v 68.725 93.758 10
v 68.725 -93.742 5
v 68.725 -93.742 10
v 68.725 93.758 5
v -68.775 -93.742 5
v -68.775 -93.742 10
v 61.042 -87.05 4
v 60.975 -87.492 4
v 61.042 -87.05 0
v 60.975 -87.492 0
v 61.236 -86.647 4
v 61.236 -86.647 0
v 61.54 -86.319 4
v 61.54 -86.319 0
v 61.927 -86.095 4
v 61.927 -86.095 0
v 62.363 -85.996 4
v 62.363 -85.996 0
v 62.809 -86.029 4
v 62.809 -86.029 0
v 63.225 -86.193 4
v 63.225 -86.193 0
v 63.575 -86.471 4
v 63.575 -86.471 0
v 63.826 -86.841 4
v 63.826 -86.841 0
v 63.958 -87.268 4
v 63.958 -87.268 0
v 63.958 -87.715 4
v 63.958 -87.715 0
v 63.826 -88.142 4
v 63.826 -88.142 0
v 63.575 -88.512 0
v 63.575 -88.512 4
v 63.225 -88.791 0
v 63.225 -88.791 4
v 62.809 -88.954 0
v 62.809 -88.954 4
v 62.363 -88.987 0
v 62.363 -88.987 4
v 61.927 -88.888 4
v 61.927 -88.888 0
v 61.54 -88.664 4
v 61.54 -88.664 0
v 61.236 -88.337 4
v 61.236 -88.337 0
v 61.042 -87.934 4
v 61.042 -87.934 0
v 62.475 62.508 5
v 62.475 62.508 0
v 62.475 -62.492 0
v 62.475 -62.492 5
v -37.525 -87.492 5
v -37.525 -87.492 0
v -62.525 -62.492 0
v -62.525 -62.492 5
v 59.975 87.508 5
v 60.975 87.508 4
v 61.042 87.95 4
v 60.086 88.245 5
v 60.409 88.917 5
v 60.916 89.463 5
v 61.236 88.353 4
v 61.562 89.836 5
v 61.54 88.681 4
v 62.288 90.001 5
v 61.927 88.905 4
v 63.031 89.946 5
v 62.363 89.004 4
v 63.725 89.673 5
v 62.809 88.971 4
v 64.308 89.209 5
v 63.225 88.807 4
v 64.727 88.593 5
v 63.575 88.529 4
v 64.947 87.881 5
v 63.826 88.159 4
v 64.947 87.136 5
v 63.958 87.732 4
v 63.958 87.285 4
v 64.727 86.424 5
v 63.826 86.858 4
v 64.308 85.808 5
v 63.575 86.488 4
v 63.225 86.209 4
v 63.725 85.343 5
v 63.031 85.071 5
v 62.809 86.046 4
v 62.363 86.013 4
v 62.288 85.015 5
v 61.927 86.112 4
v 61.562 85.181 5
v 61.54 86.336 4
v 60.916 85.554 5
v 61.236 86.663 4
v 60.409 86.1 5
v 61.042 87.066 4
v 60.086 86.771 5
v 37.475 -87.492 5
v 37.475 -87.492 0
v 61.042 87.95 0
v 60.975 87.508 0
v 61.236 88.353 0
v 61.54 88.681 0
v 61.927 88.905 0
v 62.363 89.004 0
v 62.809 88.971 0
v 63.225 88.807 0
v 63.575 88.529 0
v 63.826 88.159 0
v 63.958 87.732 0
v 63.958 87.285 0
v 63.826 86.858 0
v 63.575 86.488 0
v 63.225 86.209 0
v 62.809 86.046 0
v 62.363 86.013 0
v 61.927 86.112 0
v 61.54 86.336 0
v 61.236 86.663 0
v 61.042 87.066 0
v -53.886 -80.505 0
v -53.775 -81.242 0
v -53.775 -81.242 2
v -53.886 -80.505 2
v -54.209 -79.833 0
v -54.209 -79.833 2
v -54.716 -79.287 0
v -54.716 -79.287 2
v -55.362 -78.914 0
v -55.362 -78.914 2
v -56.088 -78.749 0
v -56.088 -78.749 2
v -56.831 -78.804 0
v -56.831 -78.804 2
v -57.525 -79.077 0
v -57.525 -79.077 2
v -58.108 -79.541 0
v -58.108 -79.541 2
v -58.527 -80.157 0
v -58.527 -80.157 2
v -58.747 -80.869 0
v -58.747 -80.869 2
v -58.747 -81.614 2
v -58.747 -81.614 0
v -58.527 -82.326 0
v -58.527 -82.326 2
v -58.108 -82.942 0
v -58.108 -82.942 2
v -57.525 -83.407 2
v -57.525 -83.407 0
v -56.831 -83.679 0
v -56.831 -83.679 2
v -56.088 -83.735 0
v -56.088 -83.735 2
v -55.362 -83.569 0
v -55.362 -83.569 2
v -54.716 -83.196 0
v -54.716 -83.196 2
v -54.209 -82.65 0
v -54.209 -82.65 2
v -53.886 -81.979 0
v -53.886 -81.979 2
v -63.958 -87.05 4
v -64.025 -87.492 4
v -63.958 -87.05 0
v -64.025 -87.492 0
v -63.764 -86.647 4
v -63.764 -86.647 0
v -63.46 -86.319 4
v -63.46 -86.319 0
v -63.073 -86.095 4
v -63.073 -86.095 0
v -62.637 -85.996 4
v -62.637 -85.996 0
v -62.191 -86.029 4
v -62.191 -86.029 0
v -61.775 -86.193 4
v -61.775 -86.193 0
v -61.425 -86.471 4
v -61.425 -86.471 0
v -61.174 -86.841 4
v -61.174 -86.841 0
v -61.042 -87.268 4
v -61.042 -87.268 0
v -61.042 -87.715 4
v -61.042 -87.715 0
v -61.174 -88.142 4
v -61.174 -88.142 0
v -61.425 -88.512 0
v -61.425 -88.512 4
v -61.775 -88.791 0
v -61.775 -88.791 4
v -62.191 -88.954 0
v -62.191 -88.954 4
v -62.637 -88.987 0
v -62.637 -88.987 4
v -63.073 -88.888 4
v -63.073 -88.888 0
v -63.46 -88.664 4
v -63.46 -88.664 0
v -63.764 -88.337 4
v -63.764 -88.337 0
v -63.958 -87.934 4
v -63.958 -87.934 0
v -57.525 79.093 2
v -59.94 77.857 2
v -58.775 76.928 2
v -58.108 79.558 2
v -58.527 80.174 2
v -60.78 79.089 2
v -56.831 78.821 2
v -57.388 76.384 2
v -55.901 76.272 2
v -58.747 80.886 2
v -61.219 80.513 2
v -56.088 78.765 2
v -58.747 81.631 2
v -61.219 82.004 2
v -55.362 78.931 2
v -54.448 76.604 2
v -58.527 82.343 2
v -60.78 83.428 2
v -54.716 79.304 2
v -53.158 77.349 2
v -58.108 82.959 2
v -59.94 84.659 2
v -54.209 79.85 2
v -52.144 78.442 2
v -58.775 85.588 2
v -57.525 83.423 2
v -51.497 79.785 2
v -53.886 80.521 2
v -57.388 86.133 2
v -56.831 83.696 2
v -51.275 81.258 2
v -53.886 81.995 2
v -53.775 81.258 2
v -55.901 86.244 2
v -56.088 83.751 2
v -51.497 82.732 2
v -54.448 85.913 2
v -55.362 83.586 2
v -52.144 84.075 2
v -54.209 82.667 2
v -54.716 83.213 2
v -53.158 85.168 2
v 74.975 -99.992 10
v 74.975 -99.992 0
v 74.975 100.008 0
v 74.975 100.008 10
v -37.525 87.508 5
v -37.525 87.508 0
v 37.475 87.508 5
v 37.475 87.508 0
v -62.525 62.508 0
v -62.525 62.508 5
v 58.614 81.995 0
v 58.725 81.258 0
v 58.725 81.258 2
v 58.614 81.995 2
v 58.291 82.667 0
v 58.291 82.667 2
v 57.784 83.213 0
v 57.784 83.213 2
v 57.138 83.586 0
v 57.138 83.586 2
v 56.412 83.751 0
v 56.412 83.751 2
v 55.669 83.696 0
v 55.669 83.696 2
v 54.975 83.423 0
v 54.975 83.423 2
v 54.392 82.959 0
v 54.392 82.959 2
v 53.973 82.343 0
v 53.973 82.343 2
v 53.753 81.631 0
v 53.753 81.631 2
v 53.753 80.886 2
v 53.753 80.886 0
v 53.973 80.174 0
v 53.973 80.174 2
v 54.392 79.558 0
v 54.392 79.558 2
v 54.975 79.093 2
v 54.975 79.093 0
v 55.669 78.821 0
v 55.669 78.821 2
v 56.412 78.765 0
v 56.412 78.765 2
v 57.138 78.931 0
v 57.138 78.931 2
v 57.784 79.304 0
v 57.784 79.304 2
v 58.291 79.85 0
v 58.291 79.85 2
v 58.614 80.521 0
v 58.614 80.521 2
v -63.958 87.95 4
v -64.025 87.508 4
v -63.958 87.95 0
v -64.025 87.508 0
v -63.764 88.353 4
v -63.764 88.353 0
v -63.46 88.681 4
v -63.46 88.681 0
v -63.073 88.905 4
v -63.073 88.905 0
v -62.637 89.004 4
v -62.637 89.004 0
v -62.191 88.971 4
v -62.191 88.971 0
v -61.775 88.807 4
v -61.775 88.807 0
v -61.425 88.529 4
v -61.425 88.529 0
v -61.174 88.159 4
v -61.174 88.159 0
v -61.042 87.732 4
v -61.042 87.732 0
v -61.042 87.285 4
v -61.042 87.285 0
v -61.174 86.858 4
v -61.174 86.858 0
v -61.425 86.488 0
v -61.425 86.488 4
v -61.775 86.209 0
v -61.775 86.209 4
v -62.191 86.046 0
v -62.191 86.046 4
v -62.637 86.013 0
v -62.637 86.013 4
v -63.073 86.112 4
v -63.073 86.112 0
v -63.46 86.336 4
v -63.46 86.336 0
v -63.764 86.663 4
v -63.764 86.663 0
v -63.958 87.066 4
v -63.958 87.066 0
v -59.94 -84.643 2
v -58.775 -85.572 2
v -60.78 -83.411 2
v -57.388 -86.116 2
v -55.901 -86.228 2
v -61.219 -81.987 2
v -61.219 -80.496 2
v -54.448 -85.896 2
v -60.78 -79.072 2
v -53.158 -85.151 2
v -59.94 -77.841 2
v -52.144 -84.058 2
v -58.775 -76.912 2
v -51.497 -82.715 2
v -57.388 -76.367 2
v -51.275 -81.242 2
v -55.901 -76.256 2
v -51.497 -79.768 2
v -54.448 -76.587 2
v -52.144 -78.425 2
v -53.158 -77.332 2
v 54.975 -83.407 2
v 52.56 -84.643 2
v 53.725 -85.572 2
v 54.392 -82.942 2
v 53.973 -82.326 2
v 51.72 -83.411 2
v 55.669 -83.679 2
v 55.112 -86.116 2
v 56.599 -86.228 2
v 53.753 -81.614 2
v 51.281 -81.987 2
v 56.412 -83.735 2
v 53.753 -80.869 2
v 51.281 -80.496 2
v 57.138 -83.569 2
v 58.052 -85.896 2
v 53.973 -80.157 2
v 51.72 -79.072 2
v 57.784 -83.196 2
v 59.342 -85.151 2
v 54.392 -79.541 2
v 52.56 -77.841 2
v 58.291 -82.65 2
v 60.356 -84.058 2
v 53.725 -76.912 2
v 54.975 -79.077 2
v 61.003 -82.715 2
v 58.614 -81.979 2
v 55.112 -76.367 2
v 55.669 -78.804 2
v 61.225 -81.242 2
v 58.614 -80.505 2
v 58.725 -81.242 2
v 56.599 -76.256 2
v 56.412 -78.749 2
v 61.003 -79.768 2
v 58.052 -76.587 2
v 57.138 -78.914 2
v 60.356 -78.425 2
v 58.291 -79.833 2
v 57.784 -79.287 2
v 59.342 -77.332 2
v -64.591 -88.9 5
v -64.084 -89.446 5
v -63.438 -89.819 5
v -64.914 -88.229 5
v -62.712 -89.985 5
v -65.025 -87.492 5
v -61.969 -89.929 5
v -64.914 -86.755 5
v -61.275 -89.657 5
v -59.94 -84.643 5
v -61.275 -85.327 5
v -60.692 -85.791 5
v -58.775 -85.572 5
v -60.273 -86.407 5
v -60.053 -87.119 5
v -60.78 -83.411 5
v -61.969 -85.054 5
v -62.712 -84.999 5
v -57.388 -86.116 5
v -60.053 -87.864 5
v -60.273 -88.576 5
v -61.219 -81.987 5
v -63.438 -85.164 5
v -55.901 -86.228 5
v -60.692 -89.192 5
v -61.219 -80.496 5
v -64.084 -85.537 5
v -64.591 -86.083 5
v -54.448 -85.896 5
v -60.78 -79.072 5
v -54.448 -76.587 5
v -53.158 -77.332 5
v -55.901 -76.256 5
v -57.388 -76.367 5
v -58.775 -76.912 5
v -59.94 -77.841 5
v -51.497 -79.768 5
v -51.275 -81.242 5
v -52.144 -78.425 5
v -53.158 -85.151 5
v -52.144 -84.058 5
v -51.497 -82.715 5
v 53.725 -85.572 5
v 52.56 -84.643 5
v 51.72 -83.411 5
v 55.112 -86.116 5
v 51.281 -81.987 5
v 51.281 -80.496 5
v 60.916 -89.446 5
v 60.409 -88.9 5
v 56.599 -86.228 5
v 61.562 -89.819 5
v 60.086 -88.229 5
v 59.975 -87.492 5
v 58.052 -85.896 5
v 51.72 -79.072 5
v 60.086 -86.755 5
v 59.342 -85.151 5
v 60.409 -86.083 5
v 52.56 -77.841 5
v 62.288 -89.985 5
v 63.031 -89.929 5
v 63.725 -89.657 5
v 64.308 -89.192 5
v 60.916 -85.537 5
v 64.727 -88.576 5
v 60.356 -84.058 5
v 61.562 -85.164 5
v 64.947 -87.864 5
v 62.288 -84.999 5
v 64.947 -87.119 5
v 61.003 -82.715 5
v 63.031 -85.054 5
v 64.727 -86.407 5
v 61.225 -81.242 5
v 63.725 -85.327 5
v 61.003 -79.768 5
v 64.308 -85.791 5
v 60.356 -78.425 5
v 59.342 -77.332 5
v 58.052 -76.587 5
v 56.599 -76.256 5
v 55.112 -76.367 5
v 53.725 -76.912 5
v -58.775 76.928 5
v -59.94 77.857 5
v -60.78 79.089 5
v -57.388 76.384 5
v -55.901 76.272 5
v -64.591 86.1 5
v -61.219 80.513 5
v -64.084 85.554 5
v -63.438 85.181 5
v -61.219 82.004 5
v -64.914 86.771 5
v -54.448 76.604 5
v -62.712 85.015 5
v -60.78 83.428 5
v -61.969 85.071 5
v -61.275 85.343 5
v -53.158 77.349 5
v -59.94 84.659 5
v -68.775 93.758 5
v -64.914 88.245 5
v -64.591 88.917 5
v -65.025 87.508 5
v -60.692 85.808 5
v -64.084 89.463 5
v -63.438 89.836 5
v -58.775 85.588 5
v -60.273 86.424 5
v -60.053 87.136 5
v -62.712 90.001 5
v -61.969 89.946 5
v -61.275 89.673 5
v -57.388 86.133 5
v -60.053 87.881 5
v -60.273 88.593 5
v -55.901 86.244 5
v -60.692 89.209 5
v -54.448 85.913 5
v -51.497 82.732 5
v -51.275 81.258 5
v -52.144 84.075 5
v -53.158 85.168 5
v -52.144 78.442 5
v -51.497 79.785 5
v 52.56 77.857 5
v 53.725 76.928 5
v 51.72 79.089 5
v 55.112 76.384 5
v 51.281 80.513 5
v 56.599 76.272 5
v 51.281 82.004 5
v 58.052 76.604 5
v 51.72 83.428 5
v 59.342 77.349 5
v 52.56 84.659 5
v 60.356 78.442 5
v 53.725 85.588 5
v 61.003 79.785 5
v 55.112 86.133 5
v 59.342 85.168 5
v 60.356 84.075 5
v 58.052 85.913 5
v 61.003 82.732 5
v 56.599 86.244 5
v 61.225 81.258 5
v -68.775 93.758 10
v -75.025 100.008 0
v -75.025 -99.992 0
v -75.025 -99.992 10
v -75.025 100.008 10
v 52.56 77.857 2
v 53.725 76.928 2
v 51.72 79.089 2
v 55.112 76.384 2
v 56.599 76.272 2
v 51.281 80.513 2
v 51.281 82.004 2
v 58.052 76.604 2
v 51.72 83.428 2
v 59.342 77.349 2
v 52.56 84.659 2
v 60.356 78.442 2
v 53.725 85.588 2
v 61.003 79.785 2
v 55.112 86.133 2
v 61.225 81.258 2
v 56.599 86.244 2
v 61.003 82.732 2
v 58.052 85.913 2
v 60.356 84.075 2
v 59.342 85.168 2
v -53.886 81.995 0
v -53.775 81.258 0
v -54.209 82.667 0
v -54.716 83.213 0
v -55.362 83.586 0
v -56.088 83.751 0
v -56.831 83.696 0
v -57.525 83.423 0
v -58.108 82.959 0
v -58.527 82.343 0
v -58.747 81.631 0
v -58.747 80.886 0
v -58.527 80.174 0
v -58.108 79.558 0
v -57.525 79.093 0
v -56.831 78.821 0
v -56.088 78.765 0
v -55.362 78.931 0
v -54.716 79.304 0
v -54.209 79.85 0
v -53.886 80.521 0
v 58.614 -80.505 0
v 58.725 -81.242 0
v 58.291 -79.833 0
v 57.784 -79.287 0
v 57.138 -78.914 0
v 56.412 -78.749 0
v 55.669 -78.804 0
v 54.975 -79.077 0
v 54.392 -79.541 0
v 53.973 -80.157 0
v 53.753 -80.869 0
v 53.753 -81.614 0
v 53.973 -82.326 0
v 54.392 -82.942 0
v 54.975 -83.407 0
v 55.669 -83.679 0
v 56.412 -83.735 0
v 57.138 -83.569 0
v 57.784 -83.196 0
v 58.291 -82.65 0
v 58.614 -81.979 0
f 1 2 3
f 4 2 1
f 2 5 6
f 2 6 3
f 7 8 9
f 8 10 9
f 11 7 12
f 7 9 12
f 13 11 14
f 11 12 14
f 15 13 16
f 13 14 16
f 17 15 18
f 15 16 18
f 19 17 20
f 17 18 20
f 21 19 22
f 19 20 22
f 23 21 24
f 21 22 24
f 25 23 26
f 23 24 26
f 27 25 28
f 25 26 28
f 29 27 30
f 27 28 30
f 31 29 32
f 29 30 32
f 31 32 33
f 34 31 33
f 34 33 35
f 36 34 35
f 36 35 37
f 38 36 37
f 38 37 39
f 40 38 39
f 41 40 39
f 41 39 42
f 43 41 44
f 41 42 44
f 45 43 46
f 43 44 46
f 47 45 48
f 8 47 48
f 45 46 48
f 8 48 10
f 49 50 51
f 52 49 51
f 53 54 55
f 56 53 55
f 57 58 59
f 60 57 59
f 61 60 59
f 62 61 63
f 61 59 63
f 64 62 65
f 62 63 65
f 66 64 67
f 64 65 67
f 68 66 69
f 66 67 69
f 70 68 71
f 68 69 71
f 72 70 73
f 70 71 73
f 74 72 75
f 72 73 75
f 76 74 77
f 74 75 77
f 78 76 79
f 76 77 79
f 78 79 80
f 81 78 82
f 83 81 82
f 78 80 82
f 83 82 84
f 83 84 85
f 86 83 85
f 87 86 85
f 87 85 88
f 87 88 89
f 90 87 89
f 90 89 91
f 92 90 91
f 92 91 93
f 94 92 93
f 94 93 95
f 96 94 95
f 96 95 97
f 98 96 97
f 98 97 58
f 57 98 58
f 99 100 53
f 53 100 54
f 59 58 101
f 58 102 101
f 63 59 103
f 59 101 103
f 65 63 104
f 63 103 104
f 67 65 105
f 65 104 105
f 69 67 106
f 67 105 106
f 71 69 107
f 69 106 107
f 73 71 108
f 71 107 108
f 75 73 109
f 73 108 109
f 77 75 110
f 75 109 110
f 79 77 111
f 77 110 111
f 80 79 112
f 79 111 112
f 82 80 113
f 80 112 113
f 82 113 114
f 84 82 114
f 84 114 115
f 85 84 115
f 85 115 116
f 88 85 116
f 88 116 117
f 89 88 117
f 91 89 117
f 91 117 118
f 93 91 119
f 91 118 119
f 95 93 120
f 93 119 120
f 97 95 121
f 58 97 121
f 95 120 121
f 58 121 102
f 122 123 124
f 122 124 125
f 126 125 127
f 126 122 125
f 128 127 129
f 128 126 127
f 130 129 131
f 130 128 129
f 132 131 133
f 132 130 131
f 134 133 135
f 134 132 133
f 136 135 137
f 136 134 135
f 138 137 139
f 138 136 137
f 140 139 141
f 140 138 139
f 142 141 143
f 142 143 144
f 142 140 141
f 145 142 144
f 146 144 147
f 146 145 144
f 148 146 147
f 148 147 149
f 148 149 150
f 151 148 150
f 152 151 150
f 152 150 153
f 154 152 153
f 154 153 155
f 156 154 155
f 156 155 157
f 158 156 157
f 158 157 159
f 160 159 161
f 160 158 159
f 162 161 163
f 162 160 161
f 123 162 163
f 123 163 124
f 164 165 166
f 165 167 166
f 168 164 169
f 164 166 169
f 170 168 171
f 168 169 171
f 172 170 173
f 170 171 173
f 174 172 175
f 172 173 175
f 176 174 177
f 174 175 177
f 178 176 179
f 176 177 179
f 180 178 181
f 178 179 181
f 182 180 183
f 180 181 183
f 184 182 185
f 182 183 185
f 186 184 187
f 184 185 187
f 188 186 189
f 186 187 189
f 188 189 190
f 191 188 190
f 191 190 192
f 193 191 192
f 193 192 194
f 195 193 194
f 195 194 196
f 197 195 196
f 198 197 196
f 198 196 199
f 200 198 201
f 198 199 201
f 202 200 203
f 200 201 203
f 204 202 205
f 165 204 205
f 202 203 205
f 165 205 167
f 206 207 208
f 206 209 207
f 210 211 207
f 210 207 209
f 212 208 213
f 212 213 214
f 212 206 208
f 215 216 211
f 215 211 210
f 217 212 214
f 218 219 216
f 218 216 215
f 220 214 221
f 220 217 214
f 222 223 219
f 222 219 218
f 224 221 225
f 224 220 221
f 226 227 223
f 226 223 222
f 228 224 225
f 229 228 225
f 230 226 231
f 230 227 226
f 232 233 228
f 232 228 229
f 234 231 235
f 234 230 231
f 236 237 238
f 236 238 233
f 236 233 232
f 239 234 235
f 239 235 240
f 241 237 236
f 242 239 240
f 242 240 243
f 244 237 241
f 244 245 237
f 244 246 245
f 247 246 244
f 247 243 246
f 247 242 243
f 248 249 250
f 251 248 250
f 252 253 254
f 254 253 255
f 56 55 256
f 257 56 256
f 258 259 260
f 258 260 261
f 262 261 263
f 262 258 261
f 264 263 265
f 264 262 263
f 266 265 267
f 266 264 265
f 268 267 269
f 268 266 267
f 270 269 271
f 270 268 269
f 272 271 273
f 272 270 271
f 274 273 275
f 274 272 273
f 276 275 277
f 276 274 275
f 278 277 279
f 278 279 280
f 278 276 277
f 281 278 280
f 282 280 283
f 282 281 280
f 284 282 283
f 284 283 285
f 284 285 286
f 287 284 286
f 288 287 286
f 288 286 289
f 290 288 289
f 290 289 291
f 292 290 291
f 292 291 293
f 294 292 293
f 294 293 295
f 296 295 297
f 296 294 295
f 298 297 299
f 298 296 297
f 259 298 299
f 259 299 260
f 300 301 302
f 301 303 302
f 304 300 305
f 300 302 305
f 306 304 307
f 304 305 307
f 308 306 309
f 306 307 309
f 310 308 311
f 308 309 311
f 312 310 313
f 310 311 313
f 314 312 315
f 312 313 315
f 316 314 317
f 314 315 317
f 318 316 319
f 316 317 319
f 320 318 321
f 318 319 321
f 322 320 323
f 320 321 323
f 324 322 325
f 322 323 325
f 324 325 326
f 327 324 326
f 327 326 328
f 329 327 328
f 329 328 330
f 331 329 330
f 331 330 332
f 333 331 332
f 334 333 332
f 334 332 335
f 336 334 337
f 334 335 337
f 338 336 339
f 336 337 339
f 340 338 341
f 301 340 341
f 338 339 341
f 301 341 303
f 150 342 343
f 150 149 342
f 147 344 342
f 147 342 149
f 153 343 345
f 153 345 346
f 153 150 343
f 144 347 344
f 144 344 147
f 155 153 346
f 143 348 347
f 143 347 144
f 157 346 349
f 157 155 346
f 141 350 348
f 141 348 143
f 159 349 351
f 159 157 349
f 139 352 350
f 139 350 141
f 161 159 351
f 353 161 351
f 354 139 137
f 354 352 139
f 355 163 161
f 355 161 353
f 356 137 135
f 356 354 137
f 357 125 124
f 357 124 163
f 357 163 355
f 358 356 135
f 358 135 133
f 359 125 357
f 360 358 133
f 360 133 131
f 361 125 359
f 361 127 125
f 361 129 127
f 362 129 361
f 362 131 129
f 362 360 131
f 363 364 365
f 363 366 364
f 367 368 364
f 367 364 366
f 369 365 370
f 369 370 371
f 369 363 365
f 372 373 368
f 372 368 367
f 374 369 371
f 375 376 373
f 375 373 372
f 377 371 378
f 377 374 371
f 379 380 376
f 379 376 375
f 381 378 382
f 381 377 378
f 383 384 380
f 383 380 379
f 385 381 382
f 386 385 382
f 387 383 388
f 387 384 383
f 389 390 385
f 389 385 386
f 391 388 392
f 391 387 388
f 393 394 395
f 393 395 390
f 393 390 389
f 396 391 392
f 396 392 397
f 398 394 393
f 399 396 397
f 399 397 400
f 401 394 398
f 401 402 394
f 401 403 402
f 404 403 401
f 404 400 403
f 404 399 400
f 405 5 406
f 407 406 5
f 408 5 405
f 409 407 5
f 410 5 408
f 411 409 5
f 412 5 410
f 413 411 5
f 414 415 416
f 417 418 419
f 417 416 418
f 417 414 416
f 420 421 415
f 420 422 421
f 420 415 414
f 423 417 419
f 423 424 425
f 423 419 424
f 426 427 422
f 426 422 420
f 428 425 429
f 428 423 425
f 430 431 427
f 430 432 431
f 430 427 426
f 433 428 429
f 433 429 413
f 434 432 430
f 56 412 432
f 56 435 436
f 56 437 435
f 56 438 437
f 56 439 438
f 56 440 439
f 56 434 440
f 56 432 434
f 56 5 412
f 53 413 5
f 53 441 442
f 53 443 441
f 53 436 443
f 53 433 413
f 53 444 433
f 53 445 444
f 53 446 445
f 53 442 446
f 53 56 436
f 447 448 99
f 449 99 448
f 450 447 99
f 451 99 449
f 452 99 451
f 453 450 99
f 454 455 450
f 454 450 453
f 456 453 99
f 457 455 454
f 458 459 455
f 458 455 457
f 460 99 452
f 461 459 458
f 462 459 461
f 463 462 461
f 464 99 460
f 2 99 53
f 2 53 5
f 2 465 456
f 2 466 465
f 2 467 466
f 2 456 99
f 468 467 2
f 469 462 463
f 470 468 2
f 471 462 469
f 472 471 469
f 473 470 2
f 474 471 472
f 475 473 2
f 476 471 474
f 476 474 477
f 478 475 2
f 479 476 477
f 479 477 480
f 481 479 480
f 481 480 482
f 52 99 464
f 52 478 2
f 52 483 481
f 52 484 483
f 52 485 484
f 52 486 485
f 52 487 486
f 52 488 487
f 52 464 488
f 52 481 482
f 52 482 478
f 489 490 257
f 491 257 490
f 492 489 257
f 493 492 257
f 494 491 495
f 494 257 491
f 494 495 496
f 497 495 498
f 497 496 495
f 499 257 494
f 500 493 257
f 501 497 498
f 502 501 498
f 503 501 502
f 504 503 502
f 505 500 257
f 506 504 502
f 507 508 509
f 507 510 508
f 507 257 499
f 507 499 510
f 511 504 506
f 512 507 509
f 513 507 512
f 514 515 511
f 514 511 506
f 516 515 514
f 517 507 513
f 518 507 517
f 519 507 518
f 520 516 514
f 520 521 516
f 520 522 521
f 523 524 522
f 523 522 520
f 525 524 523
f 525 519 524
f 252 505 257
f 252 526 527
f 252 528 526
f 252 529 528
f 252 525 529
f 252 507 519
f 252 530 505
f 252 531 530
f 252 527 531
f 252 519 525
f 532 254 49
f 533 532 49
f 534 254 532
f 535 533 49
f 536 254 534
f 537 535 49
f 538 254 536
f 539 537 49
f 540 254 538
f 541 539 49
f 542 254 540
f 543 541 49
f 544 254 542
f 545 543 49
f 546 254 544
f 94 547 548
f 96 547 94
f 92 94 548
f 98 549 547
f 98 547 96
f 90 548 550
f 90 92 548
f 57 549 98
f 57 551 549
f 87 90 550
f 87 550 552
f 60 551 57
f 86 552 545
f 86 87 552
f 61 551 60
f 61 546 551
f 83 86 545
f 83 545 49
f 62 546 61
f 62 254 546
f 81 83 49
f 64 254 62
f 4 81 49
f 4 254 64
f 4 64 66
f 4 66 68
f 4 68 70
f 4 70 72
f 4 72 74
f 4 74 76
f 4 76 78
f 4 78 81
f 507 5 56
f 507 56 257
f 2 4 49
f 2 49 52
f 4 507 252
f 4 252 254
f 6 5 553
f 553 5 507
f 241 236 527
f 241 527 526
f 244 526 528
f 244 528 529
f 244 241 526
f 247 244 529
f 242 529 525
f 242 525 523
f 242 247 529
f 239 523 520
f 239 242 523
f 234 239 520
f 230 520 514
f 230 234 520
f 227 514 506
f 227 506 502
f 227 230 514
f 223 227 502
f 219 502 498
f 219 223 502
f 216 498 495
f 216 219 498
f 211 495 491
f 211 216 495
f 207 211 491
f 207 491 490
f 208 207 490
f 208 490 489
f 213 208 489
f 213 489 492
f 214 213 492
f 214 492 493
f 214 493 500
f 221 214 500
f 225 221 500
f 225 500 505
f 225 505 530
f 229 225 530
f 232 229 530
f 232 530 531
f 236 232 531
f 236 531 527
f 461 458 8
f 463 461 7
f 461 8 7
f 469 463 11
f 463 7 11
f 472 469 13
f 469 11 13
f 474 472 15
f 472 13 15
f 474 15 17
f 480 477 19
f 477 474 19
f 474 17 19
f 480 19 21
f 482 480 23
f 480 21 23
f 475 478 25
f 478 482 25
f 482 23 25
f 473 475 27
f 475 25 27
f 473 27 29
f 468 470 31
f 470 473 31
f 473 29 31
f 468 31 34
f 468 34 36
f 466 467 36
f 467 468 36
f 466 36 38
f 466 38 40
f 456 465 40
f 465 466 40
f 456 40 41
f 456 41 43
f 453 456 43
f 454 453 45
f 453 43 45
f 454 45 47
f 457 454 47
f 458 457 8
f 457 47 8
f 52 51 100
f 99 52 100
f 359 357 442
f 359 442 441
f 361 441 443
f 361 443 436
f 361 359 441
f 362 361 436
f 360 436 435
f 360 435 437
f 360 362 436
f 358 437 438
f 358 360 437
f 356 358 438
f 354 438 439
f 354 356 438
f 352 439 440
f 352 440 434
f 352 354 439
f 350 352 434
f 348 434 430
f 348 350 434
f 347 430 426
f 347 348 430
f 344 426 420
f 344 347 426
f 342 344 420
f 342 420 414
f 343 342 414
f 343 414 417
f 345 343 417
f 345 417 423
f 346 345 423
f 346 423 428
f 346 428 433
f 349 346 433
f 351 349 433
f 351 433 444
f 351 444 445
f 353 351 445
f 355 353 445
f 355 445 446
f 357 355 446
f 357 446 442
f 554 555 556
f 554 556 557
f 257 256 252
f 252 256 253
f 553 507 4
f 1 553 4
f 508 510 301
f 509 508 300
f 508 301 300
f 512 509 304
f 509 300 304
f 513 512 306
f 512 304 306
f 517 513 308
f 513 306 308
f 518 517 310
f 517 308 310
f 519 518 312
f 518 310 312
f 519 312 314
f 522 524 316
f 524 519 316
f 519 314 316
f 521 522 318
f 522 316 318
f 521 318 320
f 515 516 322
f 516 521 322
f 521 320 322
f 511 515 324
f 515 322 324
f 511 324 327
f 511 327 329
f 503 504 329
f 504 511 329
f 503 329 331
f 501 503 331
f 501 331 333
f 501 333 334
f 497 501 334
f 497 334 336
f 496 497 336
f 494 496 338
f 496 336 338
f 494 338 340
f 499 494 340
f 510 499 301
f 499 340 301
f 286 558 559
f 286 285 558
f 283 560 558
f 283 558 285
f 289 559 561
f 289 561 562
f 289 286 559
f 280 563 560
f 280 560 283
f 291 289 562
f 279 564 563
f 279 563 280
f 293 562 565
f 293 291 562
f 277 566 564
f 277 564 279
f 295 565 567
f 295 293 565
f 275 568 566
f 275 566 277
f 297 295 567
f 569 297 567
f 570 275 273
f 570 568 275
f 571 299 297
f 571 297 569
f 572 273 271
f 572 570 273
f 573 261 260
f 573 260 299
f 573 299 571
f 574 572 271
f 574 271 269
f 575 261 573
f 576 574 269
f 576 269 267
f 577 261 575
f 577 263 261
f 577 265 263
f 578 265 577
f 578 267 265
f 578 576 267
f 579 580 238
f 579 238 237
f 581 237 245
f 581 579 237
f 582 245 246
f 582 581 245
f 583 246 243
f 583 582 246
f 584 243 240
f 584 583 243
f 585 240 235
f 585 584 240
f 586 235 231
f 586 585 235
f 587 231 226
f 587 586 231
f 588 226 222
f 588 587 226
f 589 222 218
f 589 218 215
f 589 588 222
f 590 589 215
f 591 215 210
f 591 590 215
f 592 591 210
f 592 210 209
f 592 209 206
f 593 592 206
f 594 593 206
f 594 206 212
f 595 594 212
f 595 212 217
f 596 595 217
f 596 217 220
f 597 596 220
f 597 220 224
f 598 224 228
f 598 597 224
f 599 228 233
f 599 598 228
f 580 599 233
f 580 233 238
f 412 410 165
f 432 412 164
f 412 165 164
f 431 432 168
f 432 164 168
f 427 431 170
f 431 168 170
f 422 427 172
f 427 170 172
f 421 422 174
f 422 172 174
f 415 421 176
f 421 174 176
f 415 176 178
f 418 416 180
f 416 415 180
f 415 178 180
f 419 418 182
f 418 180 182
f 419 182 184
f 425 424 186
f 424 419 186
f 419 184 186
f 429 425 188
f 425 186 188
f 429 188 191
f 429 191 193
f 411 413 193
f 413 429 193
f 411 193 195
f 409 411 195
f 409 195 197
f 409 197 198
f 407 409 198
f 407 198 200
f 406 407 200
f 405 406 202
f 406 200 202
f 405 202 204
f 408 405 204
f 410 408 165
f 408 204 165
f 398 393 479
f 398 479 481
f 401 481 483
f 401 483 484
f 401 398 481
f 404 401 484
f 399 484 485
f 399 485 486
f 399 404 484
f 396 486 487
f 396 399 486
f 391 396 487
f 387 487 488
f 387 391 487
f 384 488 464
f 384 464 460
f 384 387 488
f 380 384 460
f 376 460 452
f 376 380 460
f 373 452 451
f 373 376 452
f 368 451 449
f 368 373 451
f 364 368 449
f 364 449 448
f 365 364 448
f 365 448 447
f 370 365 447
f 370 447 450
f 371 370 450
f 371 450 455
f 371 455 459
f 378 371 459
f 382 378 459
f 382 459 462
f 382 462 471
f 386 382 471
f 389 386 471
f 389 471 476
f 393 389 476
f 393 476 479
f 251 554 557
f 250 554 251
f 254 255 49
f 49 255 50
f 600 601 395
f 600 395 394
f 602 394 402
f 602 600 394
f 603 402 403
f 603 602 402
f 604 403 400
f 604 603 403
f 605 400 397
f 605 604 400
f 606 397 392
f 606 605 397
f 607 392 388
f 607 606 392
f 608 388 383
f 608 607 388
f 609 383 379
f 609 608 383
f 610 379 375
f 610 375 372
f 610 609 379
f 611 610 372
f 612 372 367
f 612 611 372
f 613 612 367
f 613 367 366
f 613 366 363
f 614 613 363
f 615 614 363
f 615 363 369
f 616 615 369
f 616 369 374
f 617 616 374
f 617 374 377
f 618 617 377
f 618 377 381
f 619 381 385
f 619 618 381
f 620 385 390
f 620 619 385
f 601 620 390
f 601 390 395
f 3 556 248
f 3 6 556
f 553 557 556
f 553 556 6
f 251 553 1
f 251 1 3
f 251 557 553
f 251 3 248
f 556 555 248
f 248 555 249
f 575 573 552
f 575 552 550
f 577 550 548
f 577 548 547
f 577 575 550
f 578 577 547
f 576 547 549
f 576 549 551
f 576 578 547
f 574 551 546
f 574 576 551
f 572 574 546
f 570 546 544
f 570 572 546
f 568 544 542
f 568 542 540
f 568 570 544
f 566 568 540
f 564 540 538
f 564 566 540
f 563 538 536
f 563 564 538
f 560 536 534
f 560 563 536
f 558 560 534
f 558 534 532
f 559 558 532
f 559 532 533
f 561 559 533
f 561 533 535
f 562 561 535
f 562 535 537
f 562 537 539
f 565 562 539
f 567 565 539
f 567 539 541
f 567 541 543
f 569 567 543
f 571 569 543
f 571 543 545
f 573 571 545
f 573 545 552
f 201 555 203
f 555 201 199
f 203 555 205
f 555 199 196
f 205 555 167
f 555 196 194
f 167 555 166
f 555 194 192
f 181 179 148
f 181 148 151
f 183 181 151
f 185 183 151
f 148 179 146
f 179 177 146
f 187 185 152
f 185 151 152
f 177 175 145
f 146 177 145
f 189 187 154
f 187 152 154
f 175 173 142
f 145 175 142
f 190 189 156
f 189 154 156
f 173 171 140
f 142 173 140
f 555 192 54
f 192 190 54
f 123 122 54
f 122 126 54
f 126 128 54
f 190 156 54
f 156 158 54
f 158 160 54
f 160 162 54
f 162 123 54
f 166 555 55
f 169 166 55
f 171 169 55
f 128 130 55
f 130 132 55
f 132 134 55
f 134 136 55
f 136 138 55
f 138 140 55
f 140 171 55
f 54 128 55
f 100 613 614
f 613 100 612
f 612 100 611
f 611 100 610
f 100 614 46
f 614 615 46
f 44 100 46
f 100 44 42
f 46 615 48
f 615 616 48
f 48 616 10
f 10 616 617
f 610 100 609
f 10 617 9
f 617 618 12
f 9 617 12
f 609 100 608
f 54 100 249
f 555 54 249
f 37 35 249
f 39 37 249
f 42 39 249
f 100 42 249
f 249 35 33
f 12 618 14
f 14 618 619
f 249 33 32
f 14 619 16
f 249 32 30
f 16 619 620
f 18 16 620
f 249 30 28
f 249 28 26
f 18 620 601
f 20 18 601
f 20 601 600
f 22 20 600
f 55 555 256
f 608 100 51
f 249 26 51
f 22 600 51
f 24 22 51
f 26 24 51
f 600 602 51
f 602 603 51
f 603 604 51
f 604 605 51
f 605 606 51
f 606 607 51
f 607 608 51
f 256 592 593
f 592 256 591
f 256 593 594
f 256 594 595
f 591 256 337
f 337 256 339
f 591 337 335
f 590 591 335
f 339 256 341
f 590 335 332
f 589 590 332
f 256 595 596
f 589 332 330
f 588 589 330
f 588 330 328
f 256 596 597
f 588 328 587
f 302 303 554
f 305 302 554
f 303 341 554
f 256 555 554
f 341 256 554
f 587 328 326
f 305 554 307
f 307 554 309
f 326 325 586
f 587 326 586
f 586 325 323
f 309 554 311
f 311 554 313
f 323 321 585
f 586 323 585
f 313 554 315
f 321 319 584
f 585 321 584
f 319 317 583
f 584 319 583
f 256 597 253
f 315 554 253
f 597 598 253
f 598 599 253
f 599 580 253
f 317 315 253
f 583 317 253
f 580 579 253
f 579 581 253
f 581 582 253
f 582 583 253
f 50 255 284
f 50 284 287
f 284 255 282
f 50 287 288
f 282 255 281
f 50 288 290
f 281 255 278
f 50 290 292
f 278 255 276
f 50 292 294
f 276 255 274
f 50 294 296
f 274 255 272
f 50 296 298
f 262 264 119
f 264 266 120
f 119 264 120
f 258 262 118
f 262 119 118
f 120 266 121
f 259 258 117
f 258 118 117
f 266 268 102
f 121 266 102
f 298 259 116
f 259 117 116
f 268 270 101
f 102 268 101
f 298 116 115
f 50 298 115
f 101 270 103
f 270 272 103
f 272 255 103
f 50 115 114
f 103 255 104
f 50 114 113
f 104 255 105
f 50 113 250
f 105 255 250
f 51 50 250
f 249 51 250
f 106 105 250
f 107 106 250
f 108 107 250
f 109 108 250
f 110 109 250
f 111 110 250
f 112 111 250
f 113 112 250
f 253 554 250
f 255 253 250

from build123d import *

# Parameters (mm, degrees)
F0_W           = 150
F0_H           = 200
F0_W_2         = 137.5
F0_H_2         = 187.5
F1_DEPTH       = 10
F0_R           = 5
F2_DEPTH       = 5
F0_R_2         = 2.5
F3_DEPTH       = 2
F5_D           = 3
F5_CSINK_D     = 5
F5_CSINK_ANGLE = 90


with BuildPart() as f1:
    # F0 (on Top) → F1 (new body)
    with BuildSketch(Plane.XY):
        with Locations((-0.025054, 0.008351)):
            Rectangle(F0_W, F0_H)
        with Locations((-0.025054, 0.008351)):
            Rectangle(F0_W_2, F0_H_2, mode=Mode.SUBTRACT)
    extrude(amount=F1_DEPTH)

    # F0 (on Top) → F2 (join)
    with BuildSketch(Plane.XY):
        with Locations((-0.025054, 0.008351)):
            Rectangle(F0_W_2, F0_H_2)
        Polygon((-62.525054, 62.508351), (-62.525054, 87.508351), (-37.525054, 87.508351), (37.474946, 87.508351), (62.474946, 87.508351), (62.474946, 62.508351), (62.474946, -62.491649), (62.474946, -87.491649), (37.474946, -87.491649), (-37.525054, -87.491649), (-62.525054, -87.491649), (-62.525054, -62.491649), align=None, mode=Mode.SUBTRACT)
        Polygon((-37.525054, 87.508351), (-62.525054, 87.508351), (-62.525054, 62.508351), align=None)
        with Locations((-56.275054, 81.258351)):
            Circle(F0_R, mode=Mode.SUBTRACT)
        Polygon((62.474946, 87.508351), (37.474946, 87.508351), (62.474946, 62.508351), align=None)
        with Locations((56.224946, 81.258351)):
            Circle(F0_R, mode=Mode.SUBTRACT)
        Polygon((62.474946, -87.491649), (62.474946, -62.491649), (37.474946, -87.491649), align=None)
        with Locations((56.224946, -81.241649)):
            Circle(F0_R, mode=Mode.SUBTRACT)
        Polygon((-37.525054, -87.491649), (-62.525054, -62.491649), (-62.525054, -87.491649), align=None)
        with Locations((-56.275054, -81.241649)):
            Circle(F0_R, mode=Mode.SUBTRACT)
    extrude(amount=F2_DEPTH)

    # F0 (on Top) → F3 (join)
    with BuildSketch(Plane.XY):
        with Locations((-56.275054, 81.258351)):
            Circle(F0_R)
        with Locations((-56.275054, 81.258351)):
            Circle(F0_R_2, mode=Mode.SUBTRACT)
        with Locations((56.224946, 81.258351)):
            Circle(F0_R)
        with Locations((56.224946, 81.258351)):
            Circle(F0_R_2, mode=Mode.SUBTRACT)
        with Locations((56.224946, -81.241649)):
            Circle(F0_R)
        with Locations((56.224946, -81.241649)):
            Circle(F0_R_2, mode=Mode.SUBTRACT)
        with Locations((-56.275054, -81.241649)):
            Circle(F0_R)
        with Locations((-56.275054, -81.241649)):
            Circle(F0_R_2, mode=Mode.SUBTRACT)
    extrude(amount=F3_DEPTH)

    # F5 (through all)
    with Locations(Plane.XY.offset(5)):
        with Locations((-62.525054, 87.508351), (62.474946, 87.508351), (62.474946, -87.491649), (-62.525054, -87.491649)):
            CounterSinkHole(F5_D / 2, F5_CSINK_D / 2, counter_sink_angle=F5_CSINK_ANGLE)


solid = f1.part
